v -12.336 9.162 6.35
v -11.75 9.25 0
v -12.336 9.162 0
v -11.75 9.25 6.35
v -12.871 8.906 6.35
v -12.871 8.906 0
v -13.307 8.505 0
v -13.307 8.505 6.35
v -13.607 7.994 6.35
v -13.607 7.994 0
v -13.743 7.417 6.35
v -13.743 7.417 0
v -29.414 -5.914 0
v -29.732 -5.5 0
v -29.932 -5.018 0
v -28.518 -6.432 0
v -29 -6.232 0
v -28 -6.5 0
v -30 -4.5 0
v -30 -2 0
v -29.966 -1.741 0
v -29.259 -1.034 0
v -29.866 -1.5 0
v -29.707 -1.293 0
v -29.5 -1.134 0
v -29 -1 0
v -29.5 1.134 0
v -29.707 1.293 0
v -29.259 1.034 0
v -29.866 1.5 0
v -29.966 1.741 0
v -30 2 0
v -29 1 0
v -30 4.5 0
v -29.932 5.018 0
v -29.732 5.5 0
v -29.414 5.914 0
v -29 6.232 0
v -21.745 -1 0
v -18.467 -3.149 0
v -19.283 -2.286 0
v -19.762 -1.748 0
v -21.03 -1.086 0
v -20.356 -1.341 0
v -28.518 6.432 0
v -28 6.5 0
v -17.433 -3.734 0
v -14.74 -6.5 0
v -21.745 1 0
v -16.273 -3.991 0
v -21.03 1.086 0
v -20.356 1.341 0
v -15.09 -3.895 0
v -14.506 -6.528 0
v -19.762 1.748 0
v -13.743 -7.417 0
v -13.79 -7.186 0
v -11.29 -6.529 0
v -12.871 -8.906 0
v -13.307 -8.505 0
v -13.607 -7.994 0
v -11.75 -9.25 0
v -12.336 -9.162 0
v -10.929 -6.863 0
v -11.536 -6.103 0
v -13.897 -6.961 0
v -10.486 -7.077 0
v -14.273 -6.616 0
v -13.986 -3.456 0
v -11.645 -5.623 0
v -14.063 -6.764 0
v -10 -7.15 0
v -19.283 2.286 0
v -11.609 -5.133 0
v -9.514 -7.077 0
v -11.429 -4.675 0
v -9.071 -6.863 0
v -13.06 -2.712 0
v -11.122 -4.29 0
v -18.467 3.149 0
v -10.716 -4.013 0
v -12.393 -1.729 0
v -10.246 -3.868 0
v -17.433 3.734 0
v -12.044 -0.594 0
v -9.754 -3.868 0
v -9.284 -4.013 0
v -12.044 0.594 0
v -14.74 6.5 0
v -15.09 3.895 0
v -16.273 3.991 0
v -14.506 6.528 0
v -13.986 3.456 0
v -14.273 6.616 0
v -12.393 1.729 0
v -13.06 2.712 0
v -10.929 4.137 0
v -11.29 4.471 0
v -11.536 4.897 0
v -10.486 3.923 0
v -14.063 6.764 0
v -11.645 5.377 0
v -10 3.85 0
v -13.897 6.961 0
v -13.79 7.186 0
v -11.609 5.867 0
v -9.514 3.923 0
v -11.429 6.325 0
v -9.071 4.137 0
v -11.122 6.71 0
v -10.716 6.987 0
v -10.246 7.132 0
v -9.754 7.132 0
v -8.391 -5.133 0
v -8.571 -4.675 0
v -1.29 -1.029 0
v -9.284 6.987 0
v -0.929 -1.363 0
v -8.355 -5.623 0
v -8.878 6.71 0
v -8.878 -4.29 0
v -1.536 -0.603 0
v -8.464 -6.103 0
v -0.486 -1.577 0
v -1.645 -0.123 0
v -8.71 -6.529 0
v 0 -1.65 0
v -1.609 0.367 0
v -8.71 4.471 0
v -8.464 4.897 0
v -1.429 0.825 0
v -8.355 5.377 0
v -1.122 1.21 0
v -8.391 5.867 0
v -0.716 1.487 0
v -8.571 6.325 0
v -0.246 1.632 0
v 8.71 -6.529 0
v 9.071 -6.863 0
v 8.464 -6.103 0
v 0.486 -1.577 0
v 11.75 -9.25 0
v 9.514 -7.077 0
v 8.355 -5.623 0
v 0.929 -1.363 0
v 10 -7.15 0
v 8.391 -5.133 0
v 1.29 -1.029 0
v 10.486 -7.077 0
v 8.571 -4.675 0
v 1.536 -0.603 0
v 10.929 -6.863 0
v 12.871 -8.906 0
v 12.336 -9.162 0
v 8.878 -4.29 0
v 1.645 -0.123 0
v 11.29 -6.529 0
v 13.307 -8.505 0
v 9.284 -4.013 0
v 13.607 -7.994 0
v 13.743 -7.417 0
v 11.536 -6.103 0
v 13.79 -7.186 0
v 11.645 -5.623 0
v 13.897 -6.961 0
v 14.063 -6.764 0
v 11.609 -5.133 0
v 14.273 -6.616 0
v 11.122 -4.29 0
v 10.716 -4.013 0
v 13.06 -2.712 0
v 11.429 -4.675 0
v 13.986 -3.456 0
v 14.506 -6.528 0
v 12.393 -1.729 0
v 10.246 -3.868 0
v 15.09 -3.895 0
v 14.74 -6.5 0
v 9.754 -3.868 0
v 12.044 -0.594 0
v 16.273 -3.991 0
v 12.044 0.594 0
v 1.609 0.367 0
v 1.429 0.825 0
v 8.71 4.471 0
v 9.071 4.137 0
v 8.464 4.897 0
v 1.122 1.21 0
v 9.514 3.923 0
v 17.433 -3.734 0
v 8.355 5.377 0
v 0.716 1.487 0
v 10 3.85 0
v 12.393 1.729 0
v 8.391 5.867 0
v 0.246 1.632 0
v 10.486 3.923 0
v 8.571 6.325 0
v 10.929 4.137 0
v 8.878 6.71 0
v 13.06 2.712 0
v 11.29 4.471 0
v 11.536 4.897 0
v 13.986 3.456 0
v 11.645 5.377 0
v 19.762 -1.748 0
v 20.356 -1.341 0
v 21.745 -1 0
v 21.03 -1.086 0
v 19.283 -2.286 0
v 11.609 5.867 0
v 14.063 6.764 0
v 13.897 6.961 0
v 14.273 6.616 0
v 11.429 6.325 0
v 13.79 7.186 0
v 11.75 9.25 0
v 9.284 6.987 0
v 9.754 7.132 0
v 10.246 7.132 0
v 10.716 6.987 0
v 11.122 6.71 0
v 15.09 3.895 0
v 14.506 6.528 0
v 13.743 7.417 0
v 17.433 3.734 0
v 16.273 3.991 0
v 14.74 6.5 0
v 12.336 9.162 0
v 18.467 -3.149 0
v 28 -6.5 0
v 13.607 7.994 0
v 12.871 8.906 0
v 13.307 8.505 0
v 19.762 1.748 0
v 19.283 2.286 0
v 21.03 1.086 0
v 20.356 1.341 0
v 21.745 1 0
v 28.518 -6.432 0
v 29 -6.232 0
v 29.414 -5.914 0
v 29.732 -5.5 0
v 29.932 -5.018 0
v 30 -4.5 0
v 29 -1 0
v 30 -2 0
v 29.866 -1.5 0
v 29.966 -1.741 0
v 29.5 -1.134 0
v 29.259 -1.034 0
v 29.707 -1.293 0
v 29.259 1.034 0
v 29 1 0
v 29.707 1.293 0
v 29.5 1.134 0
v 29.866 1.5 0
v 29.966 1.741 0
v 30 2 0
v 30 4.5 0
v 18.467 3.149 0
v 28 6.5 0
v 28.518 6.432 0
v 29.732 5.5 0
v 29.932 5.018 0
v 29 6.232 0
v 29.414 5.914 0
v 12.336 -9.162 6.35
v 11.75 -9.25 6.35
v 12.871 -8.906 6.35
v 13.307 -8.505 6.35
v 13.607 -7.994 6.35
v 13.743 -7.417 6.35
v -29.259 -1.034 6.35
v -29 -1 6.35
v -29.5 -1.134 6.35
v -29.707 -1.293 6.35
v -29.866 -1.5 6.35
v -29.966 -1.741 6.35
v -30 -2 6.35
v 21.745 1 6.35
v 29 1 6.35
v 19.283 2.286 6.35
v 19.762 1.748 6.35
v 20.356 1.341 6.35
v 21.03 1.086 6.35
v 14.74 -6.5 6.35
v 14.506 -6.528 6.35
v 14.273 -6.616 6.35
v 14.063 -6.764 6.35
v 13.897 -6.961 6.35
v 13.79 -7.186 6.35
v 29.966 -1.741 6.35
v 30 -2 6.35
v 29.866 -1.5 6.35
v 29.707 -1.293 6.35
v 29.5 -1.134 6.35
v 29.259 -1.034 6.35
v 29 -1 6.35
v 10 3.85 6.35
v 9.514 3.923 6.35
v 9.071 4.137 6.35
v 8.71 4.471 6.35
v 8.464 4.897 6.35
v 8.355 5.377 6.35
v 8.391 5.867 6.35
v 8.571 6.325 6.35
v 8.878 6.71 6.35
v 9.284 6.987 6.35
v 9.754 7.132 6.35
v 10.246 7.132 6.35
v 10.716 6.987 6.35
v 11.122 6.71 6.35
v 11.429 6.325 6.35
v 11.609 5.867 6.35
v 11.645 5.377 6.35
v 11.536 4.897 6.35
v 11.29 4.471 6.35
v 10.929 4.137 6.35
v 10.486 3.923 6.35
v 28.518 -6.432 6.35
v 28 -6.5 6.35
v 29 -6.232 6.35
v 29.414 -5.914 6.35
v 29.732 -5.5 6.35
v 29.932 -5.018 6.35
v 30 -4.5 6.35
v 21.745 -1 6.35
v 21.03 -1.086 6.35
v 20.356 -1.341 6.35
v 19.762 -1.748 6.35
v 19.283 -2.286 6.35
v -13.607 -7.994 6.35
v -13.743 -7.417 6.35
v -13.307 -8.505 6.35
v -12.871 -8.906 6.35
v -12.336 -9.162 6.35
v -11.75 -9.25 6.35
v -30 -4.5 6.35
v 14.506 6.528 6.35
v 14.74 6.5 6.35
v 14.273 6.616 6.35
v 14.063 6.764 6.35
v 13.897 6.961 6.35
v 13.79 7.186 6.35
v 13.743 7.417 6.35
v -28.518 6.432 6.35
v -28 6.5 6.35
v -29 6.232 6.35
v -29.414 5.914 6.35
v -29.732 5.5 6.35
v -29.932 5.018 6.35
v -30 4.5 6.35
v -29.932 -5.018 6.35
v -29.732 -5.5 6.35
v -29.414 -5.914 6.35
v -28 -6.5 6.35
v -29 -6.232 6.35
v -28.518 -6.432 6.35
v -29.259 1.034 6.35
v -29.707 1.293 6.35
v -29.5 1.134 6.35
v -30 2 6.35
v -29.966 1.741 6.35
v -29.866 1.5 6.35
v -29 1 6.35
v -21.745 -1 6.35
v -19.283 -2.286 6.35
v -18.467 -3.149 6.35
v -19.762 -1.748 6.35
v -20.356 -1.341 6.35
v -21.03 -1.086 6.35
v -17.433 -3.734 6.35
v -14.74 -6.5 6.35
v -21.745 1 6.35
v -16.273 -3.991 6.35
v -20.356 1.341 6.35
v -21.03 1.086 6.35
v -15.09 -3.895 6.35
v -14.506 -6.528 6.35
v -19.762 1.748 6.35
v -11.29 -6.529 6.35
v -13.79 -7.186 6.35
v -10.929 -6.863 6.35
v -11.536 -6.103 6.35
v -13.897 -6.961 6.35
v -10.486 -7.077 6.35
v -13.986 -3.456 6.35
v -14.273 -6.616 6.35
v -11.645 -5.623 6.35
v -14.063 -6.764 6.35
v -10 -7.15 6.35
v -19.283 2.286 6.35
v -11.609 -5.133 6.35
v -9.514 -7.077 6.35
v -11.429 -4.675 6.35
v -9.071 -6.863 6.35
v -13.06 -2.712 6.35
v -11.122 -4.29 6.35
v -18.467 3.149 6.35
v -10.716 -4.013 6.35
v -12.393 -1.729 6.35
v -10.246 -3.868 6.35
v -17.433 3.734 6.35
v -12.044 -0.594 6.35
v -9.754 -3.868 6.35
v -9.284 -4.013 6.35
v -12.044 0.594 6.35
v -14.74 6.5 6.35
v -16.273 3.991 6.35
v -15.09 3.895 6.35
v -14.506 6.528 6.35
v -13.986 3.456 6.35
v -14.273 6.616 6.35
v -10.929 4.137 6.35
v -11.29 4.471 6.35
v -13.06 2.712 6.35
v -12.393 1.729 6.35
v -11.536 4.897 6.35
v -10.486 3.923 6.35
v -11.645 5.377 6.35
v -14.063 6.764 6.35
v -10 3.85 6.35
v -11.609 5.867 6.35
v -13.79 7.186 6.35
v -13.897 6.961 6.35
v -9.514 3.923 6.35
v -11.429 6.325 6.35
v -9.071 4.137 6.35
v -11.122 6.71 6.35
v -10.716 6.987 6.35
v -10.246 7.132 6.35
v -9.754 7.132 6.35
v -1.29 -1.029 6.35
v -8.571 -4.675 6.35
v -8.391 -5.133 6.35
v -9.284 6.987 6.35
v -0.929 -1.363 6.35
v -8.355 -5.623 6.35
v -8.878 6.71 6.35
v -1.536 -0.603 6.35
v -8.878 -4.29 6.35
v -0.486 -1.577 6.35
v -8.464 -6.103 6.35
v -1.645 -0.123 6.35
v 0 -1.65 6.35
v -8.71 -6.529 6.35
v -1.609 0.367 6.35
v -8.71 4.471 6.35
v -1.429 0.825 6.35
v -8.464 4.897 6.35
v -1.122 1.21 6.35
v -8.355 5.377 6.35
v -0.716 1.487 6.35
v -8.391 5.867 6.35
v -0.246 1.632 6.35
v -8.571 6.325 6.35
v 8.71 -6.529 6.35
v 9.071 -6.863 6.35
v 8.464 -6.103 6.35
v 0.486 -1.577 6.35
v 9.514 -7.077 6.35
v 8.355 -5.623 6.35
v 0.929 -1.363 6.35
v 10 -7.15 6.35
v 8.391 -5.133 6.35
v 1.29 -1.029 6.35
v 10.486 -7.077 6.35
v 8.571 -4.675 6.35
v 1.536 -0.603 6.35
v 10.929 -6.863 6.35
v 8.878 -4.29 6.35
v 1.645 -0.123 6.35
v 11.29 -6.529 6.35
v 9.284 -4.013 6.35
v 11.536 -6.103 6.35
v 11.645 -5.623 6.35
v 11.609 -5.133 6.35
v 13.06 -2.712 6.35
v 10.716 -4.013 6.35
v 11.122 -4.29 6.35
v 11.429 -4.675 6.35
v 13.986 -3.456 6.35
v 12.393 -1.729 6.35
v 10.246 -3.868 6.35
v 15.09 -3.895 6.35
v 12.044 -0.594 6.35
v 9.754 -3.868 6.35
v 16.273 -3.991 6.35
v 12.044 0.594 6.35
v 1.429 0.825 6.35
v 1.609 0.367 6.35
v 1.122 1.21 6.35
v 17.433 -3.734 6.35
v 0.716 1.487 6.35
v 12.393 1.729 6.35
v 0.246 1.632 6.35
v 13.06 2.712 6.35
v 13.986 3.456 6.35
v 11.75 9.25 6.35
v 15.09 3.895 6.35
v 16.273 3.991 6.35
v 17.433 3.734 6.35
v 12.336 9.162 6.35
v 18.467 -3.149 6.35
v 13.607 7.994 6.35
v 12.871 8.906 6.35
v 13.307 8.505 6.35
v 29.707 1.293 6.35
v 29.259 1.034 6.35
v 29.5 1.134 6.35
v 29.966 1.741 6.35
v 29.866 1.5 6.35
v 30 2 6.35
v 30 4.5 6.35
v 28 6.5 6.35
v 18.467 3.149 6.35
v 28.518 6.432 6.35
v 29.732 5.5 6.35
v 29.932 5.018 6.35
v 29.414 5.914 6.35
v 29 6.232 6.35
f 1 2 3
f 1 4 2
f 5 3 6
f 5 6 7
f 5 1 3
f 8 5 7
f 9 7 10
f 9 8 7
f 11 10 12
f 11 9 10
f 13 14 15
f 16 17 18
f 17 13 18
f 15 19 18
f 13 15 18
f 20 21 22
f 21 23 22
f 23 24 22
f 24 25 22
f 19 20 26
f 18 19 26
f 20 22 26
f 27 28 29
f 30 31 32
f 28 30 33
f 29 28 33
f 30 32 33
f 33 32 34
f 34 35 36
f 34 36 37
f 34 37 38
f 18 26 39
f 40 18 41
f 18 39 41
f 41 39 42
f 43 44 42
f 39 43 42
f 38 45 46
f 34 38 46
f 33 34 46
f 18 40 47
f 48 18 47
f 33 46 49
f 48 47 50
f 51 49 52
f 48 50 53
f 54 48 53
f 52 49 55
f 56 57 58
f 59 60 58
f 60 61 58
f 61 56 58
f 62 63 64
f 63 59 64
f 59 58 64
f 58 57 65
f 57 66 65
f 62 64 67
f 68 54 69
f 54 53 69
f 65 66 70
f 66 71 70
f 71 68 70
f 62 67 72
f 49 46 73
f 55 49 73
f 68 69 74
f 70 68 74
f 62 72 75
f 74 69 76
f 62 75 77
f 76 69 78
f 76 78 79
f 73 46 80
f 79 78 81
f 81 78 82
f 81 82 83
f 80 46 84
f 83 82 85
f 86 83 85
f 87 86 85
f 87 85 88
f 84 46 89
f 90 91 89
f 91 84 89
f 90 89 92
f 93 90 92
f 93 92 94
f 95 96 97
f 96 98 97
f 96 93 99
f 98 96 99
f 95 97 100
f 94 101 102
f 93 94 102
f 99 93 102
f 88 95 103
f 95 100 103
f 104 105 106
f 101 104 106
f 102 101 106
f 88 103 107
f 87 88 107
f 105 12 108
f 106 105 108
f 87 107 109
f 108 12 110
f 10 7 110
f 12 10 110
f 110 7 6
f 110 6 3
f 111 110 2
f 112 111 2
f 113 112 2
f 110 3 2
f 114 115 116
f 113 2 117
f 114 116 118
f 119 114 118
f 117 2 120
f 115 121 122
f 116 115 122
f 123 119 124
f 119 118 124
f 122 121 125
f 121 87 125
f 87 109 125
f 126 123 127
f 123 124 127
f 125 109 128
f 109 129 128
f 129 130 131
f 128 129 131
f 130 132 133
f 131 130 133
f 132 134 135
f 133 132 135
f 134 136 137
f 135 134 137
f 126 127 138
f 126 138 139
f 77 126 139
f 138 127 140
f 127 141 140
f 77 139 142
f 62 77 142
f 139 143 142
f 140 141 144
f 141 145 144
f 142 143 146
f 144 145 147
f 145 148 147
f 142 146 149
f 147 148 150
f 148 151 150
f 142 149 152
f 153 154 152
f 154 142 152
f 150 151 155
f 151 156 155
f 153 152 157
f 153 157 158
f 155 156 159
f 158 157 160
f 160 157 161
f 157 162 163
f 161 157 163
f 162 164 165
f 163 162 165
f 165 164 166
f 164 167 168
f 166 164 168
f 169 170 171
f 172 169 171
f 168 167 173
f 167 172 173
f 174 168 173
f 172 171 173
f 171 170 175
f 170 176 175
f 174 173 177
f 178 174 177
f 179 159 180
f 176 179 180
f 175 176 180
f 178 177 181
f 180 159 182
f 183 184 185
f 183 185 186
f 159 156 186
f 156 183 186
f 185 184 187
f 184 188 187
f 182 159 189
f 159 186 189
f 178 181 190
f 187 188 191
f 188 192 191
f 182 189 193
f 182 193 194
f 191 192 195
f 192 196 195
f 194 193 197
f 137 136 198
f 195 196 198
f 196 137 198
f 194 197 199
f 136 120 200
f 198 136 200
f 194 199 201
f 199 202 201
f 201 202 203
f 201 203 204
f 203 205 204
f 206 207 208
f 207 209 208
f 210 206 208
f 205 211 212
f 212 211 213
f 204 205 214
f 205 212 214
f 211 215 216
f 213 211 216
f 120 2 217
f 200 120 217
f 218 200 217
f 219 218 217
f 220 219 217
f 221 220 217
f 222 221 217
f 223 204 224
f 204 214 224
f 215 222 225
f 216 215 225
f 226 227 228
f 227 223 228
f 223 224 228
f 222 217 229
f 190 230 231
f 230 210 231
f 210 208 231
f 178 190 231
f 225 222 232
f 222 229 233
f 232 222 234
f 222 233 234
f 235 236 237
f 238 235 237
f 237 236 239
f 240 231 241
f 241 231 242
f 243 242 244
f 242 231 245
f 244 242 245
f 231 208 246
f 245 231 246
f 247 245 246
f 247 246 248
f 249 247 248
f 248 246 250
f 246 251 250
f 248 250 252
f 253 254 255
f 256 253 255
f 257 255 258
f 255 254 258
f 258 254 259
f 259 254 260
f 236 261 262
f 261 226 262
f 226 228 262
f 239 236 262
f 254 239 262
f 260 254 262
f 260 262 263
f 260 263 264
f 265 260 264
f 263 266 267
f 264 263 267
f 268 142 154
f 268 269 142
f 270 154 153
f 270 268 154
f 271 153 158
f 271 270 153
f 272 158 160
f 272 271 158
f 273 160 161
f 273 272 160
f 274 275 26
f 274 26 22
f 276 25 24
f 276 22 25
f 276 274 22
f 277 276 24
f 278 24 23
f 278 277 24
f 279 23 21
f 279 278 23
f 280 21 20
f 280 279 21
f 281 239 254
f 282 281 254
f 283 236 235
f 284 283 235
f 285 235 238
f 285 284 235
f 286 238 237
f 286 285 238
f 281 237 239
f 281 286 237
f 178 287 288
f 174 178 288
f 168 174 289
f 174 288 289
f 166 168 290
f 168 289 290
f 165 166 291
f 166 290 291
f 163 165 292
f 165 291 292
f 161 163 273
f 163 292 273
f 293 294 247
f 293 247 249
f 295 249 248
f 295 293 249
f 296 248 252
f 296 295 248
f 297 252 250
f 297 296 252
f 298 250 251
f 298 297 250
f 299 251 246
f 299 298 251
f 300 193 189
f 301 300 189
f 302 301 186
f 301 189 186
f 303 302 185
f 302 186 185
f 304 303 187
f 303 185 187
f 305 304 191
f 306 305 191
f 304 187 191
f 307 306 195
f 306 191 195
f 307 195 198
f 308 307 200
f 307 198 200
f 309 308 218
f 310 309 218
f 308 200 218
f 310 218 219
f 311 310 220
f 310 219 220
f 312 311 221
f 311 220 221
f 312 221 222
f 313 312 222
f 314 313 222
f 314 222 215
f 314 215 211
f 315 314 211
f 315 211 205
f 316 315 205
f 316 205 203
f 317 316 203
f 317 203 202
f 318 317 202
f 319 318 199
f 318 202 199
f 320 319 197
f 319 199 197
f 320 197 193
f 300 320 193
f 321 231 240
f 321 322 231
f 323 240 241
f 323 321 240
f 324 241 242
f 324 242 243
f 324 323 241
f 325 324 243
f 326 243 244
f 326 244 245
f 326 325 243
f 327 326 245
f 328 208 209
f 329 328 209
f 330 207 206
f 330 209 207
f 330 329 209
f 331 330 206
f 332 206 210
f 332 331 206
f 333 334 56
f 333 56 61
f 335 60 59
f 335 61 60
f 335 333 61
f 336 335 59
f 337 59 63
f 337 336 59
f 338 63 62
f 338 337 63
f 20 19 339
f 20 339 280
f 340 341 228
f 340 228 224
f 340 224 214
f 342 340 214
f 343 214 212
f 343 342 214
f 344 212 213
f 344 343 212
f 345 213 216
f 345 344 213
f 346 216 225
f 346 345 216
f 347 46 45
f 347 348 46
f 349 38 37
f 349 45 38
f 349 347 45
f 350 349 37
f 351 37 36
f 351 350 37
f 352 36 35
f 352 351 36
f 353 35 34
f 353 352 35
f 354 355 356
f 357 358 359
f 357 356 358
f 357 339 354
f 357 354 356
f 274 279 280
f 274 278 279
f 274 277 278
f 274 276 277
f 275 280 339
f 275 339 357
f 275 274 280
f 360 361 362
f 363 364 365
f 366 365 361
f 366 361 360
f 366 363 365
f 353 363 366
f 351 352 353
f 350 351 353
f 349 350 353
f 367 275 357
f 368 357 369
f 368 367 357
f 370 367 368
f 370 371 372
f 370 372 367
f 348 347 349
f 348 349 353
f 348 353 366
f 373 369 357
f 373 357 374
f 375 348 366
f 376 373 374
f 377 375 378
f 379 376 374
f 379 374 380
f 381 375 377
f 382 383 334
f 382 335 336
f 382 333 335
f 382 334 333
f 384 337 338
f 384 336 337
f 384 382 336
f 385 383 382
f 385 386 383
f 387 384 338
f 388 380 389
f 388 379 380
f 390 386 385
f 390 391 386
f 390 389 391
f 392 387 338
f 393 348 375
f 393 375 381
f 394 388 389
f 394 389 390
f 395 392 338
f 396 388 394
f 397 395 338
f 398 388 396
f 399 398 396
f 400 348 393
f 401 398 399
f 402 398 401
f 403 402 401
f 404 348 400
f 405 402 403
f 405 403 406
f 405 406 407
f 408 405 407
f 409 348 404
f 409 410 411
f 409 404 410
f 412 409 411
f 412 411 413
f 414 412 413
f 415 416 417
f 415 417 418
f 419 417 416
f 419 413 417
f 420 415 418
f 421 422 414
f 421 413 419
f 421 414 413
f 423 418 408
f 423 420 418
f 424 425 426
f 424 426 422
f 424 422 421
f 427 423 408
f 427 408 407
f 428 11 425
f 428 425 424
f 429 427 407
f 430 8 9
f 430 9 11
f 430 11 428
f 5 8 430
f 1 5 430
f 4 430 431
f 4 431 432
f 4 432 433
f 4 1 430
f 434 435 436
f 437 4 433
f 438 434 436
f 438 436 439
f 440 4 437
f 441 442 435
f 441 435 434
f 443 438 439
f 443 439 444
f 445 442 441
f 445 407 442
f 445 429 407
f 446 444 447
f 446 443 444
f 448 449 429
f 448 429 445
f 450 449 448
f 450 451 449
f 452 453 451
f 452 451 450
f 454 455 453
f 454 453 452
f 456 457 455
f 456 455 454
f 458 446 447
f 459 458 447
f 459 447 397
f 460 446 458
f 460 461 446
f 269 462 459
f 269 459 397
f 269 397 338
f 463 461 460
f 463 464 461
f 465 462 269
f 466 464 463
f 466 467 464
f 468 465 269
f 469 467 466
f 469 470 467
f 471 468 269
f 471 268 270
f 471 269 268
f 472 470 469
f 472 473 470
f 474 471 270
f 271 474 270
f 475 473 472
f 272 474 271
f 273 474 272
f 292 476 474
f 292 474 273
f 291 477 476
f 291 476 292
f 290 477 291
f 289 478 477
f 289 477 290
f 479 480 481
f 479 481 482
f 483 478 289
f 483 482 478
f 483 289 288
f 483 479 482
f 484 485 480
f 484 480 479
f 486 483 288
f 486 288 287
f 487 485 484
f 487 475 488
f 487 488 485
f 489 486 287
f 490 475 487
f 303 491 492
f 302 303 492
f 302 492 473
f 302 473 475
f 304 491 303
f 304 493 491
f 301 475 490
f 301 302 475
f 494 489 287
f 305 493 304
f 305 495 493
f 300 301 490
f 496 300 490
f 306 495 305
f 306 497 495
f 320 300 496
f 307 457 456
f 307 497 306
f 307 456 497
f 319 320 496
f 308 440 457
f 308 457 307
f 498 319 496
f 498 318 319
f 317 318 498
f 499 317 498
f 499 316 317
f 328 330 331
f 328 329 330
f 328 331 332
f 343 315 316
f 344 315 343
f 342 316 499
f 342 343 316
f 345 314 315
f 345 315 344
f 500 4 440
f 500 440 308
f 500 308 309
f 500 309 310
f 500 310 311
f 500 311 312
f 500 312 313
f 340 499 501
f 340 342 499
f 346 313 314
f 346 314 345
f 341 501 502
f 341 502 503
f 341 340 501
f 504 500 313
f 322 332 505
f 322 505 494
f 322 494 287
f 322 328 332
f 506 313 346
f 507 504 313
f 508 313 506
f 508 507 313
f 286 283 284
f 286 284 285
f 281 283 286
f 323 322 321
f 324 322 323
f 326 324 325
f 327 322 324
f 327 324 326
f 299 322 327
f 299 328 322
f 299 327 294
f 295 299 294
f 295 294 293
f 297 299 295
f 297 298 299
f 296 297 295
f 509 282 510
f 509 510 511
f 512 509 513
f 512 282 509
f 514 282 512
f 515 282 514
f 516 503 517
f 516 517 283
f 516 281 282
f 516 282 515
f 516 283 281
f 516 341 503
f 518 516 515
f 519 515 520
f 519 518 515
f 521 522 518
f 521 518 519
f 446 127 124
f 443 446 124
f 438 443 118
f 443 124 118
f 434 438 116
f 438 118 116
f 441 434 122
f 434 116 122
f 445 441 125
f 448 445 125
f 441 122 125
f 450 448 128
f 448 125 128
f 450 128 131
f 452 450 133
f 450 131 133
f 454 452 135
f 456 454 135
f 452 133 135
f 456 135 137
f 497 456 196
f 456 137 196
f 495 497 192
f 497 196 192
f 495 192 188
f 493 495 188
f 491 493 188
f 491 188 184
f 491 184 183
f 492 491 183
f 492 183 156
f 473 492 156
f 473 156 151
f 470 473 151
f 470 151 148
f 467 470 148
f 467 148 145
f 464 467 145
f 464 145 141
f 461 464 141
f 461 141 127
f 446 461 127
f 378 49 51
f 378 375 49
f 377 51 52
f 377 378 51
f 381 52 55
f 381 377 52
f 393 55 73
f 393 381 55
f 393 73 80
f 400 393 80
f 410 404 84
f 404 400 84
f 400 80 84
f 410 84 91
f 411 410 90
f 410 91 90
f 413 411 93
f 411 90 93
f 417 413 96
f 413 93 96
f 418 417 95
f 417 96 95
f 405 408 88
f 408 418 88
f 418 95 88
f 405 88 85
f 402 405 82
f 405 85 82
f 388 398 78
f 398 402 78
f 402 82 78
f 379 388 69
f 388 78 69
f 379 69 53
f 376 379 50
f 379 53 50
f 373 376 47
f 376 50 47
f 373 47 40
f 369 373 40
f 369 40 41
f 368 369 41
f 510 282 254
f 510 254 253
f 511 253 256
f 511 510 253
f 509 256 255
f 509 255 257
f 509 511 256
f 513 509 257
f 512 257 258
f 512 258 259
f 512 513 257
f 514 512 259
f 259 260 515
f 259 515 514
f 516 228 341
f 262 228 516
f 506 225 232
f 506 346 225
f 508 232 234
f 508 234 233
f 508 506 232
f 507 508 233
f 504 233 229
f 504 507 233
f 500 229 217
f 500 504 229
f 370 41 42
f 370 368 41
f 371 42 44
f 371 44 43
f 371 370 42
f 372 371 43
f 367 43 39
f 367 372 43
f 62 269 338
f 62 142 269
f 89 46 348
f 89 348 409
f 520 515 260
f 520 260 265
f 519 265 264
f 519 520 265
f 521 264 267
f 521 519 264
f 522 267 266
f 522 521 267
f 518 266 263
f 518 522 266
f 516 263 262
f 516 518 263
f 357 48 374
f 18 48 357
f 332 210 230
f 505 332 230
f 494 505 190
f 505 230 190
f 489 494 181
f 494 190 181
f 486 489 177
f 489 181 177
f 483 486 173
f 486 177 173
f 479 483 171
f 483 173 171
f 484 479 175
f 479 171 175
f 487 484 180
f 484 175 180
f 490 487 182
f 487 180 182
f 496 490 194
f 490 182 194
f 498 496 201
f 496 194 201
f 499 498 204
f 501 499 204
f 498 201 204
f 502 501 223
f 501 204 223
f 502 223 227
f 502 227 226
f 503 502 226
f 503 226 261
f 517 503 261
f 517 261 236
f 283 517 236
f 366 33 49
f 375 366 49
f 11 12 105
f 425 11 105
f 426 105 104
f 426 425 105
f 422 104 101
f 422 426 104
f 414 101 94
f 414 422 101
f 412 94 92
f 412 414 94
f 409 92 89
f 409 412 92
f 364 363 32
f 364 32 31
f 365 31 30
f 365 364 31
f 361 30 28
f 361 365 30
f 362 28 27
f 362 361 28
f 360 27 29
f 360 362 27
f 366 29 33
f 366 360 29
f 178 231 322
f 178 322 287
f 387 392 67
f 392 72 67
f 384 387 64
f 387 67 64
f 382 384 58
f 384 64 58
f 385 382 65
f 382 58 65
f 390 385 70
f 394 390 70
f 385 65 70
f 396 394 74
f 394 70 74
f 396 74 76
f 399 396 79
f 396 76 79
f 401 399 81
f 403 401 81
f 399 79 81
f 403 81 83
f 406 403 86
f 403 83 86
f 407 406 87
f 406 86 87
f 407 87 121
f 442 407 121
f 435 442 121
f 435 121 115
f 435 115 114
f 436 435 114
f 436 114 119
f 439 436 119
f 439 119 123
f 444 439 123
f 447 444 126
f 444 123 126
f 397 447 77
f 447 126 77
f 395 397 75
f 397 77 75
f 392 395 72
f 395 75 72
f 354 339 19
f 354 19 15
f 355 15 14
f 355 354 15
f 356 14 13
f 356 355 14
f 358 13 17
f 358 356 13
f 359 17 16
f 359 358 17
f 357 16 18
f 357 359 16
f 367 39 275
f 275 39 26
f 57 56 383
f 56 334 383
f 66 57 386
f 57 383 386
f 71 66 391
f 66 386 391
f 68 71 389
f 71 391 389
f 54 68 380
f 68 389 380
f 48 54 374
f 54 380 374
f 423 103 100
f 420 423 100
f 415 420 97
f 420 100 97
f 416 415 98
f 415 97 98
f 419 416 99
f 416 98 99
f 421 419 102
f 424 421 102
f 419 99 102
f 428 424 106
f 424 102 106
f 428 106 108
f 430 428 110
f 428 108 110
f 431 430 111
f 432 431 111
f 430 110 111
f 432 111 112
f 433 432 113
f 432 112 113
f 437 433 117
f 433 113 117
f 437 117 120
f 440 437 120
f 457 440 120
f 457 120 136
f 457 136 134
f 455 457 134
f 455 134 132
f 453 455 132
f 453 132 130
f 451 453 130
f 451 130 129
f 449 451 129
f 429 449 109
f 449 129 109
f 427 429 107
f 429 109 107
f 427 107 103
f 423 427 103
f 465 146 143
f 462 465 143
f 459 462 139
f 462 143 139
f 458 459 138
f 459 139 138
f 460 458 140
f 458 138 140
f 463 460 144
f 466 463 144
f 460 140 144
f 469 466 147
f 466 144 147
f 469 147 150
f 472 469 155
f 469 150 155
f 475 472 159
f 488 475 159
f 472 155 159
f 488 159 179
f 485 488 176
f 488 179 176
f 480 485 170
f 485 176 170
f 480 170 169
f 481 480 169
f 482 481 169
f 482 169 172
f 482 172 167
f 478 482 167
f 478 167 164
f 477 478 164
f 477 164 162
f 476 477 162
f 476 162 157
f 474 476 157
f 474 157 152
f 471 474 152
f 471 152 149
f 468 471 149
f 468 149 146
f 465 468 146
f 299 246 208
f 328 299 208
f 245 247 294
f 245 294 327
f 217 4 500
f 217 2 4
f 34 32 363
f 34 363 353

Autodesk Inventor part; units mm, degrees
ref_plane "YZ Plane" through (0, 0, 0) normal (1, 0, 0) x (0, 1, 0)
ref_plane "XZ Plane" through (0, 0, 0) normal (0, 1, 0) x (-1, 0, 0)
ref_plane "XY Plane" through (0, 0, 0) normal (0, 0, 1) x (1, 0, 0)
sketch "Sketch1" plane through (0, 0, 0) normal (0, 0, 1) x (1, 0, 0)
  line L0 (13.75, -9.25) -> (-13.75, -9.25)
  line L1 (-13.75, -9.25) -> (-13.75, 9.25)
  line L2 (-13.75, 9.25) -> (13.75, 9.25)
  line L3 (13.75, 9.25) -> (13.75, -9.25)
  line L4 (13.75, -9.25) -> (-13.75, 9.25) construction
  line L5 (-13.75, -9.25) -> (13.75, 9.25) construction
  line L6 (-16, 0) -> (16, 0) construction
  circle A0 centre (-16, 0) radius 4
  circle A1 centre (16, 0) radius 4
  line L7 (30, -1) -> (-30, -1)
  line L8 (-30, -1) -> (-30, 1)
  line L9 (-30, 1) -> (30, 1)
  line L10 (30, 1) -> (30, -1)
  line L11 (30, -1) -> (-30, 1) construction
  line L12 (-30, -1) -> (30, 1) construction
  line L13 (30, -6.5) -> (-30, -6.5)
  line L14 (-30, -6.5) -> (-30, 6.5)
  line L15 (-30, 6.5) -> (30, 6.5)
  line L16 (30, 6.5) -> (30, -6.5)
  line L17 (30, -6.5) -> (-30, 6.5) construction
  line L18 (-30, -6.5) -> (30, 6.5) construction
  point P0 (0, 0)
  point P1 (-19.873, -1)
  point P2 (-13.75, -6.5)
  point P3 (13.75, -6.5)
  point P4 (19.873, -1)
  point P5 (19.873, 1)
  point P6 (13.75, 6.5)
  point P7 (-13.75, 6.5)
  point P8 (-19.873, 1)
  dimension "d0" = 27.5
  dimension "d1" = 18.5
  dimension "d2" = 8
  dimension "d3" = 8
  dimension "d4" = 32
  dimension "d5" = 60
  dimension "d6" = 2
  dimension "d7" = 13
extrude "Extrusion1" add sketch "Sketch1" along normal blind 6.35 contours L0 L1 L13 L3 | L13 L1 A0 L7 A1 L3 | L3 A1 L7 L16 L13 | L13 L14 L7 A0 L1 | L7 A0 L9 A1 | L9 A0 L1 L15 L3 A1 | L9 A1 L3 L15 L16 | L9 L14 L15 L1 A0 | L15 L1 L2 L3
fillet "Fillet4" radius 3 4 edges at (-19.873, 1, 3.175) (-19.873, -1, 3.175) (19.873, 1, 3.175) (19.873, -1, 3.175)
fillet "Fillet1" radius 2 4 edges at (13.75, 9.25, 3.175) (-13.75, 9.25, 3.175) (-13.75, -9.25, 3.175) (13.75, -9.25, 3.175)
fillet "Fillet2" radius 2 4 edges at (-30, 6.5, 3.175) (-30, -6.5, 3.175) (30, 6.5, 3.175) (30, -6.5, 3.175)
fillet "Fillet3" radius 1 8 edges at (-30, -1, 3.175) (-30, 1, 3.175) (-13.75, -6.5, 3.175) (-13.75, 6.5, 3.175) (13.75, 6.5, 3.175) (13.75, -6.5, 3.175) (30, 1, 3.175) (30, -1, 3.175)
sketch "Sketch2" plane through (0, 0, 6.35) normal (0, 0, 1) x (1, 0, 0)
  line L0 (10, -5.5) -> (-10, -5.5) construction
  line L1 (-10, -5.5) -> (-10, 5.5) construction
  line L2 (-10, 5.5) -> (10, 5.5) construction
  line L3 (10, 5.5) -> (10, -5.5) construction
  line L4 (10, -5.5) -> (-10, 5.5) construction
  line L5 (-10, -5.5) -> (10, 5.5) construction
  circle A0 centre (-10, 5.5) radius 3 construction
  circle A1 centre (-10, -5.5) radius 3 construction
  circle A2 centre (-10, 5.5) radius 1.65 construction
  line L6 (11.75, 9.25) -> (-11.75, 9.25) construction
  point P0 (0, 0)
  dimension "d13" = 20
  dimension "d14" = 11
  dimension "d22" = 6
  dimension "d23" = 6
  dimension "d25" = 3.3
  dimension "d26" = 2.1
hole "Hole1" at (-10, 5.5, 6.35) at (10, 5.5, 6.35) at (10, -5.5, 6.35) at (-10, -5.5, 6.35) direction (0, 0, -1) diameter 3.3 end through all
sketch "Sketch3" plane through (0, 0, 6.35) normal (0, 0, 1) x (1, 0, 0)
  point P0 (0, 0)
hole "Hole2" at (0, 0, 6.35) direction (0, 0, -1) diameter 3.3 end through all
properties part number "Printhead Belt Retainer R2" material "Aluminum 6061"
